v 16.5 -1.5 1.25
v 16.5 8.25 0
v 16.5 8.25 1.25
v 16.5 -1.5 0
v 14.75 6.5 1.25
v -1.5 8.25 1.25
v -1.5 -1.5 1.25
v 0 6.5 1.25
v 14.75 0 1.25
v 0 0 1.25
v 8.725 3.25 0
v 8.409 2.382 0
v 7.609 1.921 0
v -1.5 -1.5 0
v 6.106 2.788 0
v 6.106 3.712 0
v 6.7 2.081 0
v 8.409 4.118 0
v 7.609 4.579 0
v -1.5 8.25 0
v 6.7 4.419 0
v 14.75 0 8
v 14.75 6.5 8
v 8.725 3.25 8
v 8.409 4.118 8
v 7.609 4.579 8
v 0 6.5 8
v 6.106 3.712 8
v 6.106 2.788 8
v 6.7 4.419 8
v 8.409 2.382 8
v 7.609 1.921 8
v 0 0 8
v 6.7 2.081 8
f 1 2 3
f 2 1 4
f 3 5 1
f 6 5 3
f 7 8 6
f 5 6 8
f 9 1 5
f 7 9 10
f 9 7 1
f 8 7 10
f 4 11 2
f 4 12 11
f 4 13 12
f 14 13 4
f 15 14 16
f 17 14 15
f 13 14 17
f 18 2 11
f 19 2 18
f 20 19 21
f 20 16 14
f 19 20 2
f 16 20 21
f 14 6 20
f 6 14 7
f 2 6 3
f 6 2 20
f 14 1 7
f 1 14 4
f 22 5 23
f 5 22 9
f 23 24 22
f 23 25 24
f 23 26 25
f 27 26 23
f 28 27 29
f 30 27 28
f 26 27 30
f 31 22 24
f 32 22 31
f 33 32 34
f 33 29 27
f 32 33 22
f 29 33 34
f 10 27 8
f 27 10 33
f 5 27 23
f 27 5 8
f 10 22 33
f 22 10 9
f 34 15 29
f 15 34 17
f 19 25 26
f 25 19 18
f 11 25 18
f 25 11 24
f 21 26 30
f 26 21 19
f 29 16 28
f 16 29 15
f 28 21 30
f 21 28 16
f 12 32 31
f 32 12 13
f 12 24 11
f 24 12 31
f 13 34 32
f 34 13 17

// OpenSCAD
// [FL_INDEX: keywords="openscad, 3d_parametric, Filament_Guide_for_Rostock_Max, csg_solid" | COT="Parametric OpenSCAD design from 3DCodeverse"]
// Title: Filament Guide for Rostock Max

tolerance = .25;
input_holesize = [15,6.75,7];
flangewidth = 3;
flangeheight = 1.25;
holesize = [input_holesize[0]-tolerance,input_holesize[1]-tolerance,input_holesize[2]];
tolerance = .25;
flange = [input_holesize[0]+flangewidth, input_holesize[1]+flangewidth, flangeheight];
filamentdiameter = 2.2;

difference(){
	union(){
		translate([-flangewidth/2,-flangewidth/2,0])cube(flange);
		translate([0,0,flangeheight-tolerance])cube(holesize);
	}
	translate([holesize[0]/2, holesize[1]/2, 0])cylinder(r=filamentdiameter/2+tolerance, h=holesize[2]+flangeheight*3, $fa=1, $fs=1);
}
